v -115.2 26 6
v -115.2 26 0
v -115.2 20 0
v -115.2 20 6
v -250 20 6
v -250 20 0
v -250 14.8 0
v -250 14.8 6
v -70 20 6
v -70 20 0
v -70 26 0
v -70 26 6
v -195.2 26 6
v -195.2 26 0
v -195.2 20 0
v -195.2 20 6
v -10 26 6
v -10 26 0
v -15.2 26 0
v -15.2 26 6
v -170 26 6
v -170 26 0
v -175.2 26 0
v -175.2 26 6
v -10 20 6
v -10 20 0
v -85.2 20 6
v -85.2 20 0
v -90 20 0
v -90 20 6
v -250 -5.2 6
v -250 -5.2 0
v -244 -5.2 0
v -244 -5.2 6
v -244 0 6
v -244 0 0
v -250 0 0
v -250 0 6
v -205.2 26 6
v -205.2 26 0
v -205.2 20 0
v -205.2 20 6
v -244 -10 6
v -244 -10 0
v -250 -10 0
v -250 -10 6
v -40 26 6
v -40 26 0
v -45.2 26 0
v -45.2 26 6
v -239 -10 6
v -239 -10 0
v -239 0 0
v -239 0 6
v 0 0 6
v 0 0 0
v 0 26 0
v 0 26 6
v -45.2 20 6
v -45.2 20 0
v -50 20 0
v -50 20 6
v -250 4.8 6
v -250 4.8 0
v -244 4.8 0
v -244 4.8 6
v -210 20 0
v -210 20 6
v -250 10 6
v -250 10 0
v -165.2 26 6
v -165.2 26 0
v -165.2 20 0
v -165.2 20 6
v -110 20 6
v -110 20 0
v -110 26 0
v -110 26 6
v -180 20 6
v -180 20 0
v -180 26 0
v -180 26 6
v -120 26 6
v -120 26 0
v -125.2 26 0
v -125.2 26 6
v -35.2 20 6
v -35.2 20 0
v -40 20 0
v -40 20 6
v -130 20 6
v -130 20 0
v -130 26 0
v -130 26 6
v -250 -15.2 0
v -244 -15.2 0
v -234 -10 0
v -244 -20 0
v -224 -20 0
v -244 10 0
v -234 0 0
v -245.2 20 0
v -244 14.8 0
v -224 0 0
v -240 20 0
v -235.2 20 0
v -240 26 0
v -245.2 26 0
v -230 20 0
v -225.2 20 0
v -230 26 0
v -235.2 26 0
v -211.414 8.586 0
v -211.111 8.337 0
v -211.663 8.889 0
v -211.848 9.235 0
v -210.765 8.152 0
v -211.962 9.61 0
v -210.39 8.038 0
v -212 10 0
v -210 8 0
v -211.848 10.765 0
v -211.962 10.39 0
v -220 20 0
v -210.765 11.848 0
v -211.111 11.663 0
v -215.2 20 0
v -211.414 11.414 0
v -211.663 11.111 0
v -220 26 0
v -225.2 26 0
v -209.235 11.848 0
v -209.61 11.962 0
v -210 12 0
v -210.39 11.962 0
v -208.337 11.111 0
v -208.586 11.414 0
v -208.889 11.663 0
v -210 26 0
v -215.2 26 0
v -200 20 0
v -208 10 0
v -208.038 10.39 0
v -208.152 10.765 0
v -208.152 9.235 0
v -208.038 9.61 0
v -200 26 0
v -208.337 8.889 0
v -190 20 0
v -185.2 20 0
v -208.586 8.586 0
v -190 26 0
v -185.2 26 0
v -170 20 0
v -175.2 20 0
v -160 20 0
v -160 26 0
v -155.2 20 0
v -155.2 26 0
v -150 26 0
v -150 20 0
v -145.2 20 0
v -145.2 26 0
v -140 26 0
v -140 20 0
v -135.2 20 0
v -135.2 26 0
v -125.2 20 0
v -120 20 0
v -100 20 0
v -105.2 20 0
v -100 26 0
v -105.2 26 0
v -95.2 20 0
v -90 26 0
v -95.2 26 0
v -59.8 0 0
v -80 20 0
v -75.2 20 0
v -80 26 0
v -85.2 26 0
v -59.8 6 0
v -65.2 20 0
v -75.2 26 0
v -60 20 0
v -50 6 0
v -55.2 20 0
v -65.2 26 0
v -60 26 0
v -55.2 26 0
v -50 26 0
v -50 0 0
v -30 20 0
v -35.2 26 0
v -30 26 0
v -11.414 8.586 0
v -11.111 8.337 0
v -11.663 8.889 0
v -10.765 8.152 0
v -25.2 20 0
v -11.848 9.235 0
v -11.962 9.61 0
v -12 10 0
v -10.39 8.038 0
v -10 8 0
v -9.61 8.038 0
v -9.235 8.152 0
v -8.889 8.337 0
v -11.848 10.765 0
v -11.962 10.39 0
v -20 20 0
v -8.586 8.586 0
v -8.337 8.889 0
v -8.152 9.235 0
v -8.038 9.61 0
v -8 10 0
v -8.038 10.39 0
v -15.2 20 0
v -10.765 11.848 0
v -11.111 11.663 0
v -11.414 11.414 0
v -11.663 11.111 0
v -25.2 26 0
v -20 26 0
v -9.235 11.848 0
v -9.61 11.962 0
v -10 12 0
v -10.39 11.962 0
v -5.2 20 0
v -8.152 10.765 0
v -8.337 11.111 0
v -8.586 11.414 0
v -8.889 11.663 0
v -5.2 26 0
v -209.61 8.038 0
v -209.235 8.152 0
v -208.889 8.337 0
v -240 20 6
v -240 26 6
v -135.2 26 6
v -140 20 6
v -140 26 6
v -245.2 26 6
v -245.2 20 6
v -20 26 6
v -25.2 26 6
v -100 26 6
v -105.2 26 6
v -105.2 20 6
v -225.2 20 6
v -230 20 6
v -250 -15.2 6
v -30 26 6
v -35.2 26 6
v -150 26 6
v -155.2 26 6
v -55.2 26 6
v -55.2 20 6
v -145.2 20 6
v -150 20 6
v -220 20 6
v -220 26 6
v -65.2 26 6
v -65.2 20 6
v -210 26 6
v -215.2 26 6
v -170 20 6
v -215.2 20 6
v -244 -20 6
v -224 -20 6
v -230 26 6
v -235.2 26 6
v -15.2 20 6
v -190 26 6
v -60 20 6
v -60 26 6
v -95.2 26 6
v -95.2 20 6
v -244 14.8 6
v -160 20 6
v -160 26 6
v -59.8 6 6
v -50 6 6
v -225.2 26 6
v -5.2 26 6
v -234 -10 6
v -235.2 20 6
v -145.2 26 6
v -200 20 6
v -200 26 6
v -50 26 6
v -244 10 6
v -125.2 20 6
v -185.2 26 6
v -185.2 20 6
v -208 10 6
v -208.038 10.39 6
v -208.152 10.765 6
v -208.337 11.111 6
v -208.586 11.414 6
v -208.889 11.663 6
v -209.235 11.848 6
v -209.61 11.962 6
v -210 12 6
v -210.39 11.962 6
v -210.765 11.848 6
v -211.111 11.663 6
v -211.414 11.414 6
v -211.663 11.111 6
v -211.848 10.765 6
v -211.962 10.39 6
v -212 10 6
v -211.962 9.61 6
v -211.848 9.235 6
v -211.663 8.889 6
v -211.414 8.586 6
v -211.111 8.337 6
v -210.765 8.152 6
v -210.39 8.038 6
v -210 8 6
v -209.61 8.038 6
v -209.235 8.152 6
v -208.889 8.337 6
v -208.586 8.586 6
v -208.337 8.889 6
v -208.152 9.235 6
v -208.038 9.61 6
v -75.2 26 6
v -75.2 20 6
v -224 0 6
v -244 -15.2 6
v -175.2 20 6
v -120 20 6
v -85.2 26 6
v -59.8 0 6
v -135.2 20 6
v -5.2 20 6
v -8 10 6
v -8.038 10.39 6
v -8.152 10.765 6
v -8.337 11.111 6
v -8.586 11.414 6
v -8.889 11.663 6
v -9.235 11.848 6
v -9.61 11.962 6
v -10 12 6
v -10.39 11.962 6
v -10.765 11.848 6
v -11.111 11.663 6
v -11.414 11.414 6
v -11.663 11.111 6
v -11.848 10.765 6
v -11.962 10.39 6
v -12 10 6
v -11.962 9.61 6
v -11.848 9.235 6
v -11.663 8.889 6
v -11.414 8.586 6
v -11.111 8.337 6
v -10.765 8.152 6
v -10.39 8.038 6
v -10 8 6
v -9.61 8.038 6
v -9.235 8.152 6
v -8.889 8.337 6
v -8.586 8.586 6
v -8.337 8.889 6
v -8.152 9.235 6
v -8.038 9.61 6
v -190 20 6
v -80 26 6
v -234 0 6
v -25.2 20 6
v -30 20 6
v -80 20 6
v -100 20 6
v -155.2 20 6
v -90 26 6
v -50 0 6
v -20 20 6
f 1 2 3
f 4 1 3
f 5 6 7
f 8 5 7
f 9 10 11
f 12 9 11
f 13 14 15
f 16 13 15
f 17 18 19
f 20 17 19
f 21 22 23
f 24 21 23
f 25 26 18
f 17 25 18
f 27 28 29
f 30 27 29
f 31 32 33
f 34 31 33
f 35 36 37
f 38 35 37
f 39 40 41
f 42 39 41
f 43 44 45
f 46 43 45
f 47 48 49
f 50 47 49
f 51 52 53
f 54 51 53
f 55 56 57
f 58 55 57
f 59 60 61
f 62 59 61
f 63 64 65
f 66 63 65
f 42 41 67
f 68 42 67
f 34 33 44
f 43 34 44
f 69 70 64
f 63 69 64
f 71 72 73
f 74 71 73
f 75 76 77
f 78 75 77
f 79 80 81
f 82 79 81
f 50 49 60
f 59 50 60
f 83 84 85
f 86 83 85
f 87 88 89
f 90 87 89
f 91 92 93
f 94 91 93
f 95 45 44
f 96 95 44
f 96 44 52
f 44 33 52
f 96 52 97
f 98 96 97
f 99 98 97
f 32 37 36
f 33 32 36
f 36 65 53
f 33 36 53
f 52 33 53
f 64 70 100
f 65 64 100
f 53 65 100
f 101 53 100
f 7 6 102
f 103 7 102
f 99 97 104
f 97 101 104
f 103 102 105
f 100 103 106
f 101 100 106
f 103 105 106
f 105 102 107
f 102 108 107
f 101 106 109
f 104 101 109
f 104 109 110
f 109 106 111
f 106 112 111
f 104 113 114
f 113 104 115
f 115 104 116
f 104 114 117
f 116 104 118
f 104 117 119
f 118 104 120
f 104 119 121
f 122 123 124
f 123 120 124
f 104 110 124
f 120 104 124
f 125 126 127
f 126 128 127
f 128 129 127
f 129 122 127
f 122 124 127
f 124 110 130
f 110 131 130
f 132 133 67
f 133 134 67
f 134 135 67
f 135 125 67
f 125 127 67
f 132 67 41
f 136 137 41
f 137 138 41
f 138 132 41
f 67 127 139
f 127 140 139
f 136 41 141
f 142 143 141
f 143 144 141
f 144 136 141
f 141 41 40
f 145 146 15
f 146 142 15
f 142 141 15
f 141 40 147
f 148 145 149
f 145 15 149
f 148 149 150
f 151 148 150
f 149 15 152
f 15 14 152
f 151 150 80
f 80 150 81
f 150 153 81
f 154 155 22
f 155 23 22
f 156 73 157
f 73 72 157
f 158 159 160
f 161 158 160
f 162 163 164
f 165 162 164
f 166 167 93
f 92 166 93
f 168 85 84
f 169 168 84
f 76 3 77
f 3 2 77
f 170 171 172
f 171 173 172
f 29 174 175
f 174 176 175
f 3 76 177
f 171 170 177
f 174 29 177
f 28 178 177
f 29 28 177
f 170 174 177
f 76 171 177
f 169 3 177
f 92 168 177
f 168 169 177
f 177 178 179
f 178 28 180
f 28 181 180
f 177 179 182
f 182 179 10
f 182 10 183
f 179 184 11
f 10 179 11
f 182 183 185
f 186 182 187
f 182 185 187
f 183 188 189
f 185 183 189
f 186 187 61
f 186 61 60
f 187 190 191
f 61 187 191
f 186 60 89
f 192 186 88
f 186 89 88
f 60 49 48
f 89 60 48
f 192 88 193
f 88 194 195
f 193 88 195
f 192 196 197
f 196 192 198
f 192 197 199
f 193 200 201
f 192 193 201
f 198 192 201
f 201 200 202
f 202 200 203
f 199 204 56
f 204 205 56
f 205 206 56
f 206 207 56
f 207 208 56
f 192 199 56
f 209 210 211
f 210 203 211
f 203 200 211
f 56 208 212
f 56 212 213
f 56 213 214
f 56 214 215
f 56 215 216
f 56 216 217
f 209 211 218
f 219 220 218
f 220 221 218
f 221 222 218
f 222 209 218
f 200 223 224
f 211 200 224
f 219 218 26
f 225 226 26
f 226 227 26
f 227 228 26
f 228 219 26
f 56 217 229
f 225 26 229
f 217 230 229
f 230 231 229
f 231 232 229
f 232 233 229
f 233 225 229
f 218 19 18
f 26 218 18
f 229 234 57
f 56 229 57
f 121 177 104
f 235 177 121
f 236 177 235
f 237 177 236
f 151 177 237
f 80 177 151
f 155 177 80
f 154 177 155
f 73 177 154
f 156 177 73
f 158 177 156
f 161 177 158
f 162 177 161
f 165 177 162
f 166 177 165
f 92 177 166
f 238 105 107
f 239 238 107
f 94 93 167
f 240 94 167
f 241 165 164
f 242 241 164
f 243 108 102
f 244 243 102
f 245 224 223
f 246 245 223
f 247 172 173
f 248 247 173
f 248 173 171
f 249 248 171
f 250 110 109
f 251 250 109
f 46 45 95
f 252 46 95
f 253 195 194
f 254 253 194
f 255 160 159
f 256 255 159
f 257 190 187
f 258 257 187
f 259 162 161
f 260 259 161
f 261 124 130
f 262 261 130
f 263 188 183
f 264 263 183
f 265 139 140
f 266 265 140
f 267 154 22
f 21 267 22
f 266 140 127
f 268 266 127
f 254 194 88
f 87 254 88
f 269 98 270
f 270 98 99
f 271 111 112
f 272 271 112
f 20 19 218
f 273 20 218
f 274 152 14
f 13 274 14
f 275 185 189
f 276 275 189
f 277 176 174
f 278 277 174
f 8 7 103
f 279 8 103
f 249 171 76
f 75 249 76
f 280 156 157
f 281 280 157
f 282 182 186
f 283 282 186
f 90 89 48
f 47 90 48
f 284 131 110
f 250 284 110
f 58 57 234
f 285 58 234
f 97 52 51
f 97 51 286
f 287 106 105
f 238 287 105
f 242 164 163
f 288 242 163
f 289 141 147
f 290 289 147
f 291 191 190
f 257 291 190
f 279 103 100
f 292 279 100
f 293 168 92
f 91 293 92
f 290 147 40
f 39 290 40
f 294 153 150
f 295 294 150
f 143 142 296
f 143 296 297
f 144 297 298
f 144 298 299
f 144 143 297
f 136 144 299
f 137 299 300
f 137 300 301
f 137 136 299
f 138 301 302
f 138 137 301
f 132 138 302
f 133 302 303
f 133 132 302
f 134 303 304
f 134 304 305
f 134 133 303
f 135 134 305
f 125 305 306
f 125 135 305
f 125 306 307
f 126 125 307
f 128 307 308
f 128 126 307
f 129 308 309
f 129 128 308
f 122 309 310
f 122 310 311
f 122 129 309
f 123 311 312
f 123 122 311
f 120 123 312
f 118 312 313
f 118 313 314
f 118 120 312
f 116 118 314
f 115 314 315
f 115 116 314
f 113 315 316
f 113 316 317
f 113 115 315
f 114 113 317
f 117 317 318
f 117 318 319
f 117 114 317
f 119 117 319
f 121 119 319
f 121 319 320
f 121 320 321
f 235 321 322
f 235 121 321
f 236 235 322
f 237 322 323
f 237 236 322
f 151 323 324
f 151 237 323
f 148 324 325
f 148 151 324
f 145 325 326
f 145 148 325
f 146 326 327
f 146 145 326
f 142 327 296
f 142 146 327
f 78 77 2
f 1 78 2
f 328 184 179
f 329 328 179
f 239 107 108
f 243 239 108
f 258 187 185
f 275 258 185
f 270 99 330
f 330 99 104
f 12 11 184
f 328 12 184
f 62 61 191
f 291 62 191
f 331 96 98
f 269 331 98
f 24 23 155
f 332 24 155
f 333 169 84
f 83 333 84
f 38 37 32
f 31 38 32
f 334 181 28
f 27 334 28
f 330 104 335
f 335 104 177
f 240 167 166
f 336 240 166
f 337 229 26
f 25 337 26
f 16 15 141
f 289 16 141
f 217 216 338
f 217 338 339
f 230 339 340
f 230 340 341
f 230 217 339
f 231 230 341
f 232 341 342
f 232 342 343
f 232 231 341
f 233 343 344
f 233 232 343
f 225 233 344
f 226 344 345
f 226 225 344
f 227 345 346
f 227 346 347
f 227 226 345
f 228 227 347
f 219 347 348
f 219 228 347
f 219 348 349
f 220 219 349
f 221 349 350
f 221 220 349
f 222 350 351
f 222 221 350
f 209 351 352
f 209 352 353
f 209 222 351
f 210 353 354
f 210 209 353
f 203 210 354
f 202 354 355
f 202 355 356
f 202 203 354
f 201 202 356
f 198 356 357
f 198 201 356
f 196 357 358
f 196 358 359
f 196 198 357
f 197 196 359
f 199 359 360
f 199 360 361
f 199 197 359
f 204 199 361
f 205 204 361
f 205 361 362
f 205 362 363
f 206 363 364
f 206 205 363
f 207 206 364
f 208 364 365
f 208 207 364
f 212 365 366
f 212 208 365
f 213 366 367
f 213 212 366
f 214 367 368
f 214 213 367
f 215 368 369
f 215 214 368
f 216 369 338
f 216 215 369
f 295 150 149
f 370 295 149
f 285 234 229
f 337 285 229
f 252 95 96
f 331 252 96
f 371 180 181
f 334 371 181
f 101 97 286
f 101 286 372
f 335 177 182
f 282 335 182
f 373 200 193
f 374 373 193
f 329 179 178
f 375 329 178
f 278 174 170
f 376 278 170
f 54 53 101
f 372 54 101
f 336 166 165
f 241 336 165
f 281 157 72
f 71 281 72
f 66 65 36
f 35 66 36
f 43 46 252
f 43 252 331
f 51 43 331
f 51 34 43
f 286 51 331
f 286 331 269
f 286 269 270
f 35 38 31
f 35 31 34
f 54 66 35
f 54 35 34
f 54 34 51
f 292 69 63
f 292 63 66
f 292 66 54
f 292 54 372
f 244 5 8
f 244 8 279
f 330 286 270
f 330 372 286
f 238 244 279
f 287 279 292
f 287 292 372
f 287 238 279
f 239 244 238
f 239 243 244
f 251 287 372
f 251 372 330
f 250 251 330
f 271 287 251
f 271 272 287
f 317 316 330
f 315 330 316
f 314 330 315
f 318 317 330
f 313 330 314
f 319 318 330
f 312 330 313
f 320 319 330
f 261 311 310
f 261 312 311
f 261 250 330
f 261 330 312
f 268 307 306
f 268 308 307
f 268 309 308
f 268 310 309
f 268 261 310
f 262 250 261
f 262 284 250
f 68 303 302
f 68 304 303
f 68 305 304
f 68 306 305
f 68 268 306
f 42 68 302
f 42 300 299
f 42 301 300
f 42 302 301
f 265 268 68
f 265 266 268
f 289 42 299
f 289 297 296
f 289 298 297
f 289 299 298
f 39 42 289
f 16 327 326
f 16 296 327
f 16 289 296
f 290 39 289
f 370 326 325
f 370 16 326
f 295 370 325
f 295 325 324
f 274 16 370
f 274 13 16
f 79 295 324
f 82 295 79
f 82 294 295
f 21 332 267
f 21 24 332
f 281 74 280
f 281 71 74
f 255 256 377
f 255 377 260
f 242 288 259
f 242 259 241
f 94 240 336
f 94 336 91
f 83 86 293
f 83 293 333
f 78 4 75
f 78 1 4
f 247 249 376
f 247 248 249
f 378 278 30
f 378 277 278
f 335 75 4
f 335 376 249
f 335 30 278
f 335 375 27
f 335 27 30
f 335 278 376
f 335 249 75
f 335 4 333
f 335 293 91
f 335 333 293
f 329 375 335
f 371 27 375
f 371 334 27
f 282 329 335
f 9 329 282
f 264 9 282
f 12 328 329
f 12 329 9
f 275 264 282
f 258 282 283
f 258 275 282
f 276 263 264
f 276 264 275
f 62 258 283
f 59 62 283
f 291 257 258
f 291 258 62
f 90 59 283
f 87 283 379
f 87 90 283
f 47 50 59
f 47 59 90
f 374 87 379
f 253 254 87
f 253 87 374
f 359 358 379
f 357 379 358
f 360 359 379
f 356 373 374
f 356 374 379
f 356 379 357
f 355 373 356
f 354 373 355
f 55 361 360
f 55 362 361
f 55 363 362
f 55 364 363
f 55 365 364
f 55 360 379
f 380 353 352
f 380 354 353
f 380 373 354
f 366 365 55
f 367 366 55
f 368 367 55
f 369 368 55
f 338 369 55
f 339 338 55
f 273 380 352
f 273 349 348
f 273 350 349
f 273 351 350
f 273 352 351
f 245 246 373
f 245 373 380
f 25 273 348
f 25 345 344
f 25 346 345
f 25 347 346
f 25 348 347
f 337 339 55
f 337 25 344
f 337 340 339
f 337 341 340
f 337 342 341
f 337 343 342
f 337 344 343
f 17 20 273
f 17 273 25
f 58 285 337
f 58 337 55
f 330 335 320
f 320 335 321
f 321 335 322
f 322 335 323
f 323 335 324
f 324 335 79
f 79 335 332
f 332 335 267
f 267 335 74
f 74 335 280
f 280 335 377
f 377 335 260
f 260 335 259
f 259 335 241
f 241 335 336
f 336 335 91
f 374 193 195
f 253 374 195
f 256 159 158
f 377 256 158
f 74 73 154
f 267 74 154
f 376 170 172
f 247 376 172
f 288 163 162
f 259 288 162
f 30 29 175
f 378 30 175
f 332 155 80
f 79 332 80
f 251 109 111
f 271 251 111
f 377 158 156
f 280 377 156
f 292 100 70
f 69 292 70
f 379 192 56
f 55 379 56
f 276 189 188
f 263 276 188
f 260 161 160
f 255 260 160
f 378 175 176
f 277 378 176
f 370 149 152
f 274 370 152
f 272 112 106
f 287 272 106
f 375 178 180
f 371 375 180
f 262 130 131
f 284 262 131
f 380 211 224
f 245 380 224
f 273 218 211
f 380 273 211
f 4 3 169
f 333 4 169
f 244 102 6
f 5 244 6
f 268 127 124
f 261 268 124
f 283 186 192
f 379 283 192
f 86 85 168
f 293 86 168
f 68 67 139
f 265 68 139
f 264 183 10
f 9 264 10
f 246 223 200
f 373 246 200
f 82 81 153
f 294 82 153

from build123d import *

# Parameters (mm, degrees)
ESQUISSE1_R        = 2
ESQUISSE1_W        = 5
ESQUISSE1_H        = 10
BOSS_EXTRU_1_DEPTH = 6


with BuildPart() as part:
    # Esquisse1 → Boss.-Extru.1 (new body)
    with BuildSketch(Plane.XY):
        Polygon((0, 0), (0, 26), (-5.2, 26), (-5.2, 20), (-10, 20), (-10, 26), (-15.2, 26), (-15.2, 20), (-20, 20), (-20, 26), (-25.2, 26), (-25.2, 20), (-30, 20), (-30, 26), (-35.2, 26), (-35.2, 20), (-40, 20), (-40, 26), (-45.2, 26), (-45.2, 20), (-50, 20), (-50, 26), (-55.2, 26), (-55.2, 20), (-60, 20), (-60, 26), (-65.2, 26), (-65.2, 20), (-70, 20), (-70, 26), (-75.2, 26), (-75.2, 20), (-80, 20), (-80, 26), (-85.2, 26), (-85.2, 20), (-90, 20), (-90, 26), (-95.2, 26), (-95.2, 20), (-100, 20), (-100, 26), (-105.2, 26), (-105.2, 20), (-110, 20), (-110, 26), (-115.2, 26), (-115.2, 20), (-120, 20), (-120, 26), (-125.2, 26), (-125.2, 20), (-130, 20), (-130, 26), (-135.2, 26), (-135.2, 20), (-140, 20), (-140, 26), (-145.2, 26), (-145.2, 20), (-150, 20), (-150, 26), (-155.2, 26), (-155.2, 20), (-160, 20), (-160, 26), (-165.2, 26), (-165.2, 20), (-170, 20), (-170, 26), (-175.2, 26), (-175.2, 20), (-180, 20), (-180, 26), (-185.2, 26), (-185.2, 20), (-190, 20), (-190, 26), (-195.2, 26), (-195.2, 20), (-200, 20), (-200, 26), (-205.2, 26), (-205.2, 20), (-210, 20), (-210, 26), (-215.2, 26), (-215.2, 20), (-220, 20), (-220, 26), (-225.2, 26), (-225.2, 20), (-230, 20), (-230, 26), (-235.2, 26), (-235.2, 20), (-240, 20), (-240, 26), (-245.2, 26), (-245.2, 20), (-250, 20), (-250, 14.8), (-244, 14.8), (-244, 10), (-250, 10), (-250, 4.8), (-244, 4.8), (-244, 0), (-250, 0), (-250, -5.2), (-244, -5.2), (-244, -10), (-250, -10), (-250, -15.2), (-244, -15.2), (-244, -20), (-224, -20), (-224, 0), (-59.8, 0), (-59.8, 6), (-50, 6), (-50, 0), align=None)
        with Locations((-210, 10)):
            Circle(ESQUISSE1_R, mode=Mode.SUBTRACT)
        with Locations((-10, 10)):
            Circle(ESQUISSE1_R, mode=Mode.SUBTRACT)
        with Locations((-236.5, -5)):
            Rectangle(ESQUISSE1_W, ESQUISSE1_H, mode=Mode.SUBTRACT)
    extrude(amount=BOSS_EXTRU_1_DEPTH)


solid = part.part
